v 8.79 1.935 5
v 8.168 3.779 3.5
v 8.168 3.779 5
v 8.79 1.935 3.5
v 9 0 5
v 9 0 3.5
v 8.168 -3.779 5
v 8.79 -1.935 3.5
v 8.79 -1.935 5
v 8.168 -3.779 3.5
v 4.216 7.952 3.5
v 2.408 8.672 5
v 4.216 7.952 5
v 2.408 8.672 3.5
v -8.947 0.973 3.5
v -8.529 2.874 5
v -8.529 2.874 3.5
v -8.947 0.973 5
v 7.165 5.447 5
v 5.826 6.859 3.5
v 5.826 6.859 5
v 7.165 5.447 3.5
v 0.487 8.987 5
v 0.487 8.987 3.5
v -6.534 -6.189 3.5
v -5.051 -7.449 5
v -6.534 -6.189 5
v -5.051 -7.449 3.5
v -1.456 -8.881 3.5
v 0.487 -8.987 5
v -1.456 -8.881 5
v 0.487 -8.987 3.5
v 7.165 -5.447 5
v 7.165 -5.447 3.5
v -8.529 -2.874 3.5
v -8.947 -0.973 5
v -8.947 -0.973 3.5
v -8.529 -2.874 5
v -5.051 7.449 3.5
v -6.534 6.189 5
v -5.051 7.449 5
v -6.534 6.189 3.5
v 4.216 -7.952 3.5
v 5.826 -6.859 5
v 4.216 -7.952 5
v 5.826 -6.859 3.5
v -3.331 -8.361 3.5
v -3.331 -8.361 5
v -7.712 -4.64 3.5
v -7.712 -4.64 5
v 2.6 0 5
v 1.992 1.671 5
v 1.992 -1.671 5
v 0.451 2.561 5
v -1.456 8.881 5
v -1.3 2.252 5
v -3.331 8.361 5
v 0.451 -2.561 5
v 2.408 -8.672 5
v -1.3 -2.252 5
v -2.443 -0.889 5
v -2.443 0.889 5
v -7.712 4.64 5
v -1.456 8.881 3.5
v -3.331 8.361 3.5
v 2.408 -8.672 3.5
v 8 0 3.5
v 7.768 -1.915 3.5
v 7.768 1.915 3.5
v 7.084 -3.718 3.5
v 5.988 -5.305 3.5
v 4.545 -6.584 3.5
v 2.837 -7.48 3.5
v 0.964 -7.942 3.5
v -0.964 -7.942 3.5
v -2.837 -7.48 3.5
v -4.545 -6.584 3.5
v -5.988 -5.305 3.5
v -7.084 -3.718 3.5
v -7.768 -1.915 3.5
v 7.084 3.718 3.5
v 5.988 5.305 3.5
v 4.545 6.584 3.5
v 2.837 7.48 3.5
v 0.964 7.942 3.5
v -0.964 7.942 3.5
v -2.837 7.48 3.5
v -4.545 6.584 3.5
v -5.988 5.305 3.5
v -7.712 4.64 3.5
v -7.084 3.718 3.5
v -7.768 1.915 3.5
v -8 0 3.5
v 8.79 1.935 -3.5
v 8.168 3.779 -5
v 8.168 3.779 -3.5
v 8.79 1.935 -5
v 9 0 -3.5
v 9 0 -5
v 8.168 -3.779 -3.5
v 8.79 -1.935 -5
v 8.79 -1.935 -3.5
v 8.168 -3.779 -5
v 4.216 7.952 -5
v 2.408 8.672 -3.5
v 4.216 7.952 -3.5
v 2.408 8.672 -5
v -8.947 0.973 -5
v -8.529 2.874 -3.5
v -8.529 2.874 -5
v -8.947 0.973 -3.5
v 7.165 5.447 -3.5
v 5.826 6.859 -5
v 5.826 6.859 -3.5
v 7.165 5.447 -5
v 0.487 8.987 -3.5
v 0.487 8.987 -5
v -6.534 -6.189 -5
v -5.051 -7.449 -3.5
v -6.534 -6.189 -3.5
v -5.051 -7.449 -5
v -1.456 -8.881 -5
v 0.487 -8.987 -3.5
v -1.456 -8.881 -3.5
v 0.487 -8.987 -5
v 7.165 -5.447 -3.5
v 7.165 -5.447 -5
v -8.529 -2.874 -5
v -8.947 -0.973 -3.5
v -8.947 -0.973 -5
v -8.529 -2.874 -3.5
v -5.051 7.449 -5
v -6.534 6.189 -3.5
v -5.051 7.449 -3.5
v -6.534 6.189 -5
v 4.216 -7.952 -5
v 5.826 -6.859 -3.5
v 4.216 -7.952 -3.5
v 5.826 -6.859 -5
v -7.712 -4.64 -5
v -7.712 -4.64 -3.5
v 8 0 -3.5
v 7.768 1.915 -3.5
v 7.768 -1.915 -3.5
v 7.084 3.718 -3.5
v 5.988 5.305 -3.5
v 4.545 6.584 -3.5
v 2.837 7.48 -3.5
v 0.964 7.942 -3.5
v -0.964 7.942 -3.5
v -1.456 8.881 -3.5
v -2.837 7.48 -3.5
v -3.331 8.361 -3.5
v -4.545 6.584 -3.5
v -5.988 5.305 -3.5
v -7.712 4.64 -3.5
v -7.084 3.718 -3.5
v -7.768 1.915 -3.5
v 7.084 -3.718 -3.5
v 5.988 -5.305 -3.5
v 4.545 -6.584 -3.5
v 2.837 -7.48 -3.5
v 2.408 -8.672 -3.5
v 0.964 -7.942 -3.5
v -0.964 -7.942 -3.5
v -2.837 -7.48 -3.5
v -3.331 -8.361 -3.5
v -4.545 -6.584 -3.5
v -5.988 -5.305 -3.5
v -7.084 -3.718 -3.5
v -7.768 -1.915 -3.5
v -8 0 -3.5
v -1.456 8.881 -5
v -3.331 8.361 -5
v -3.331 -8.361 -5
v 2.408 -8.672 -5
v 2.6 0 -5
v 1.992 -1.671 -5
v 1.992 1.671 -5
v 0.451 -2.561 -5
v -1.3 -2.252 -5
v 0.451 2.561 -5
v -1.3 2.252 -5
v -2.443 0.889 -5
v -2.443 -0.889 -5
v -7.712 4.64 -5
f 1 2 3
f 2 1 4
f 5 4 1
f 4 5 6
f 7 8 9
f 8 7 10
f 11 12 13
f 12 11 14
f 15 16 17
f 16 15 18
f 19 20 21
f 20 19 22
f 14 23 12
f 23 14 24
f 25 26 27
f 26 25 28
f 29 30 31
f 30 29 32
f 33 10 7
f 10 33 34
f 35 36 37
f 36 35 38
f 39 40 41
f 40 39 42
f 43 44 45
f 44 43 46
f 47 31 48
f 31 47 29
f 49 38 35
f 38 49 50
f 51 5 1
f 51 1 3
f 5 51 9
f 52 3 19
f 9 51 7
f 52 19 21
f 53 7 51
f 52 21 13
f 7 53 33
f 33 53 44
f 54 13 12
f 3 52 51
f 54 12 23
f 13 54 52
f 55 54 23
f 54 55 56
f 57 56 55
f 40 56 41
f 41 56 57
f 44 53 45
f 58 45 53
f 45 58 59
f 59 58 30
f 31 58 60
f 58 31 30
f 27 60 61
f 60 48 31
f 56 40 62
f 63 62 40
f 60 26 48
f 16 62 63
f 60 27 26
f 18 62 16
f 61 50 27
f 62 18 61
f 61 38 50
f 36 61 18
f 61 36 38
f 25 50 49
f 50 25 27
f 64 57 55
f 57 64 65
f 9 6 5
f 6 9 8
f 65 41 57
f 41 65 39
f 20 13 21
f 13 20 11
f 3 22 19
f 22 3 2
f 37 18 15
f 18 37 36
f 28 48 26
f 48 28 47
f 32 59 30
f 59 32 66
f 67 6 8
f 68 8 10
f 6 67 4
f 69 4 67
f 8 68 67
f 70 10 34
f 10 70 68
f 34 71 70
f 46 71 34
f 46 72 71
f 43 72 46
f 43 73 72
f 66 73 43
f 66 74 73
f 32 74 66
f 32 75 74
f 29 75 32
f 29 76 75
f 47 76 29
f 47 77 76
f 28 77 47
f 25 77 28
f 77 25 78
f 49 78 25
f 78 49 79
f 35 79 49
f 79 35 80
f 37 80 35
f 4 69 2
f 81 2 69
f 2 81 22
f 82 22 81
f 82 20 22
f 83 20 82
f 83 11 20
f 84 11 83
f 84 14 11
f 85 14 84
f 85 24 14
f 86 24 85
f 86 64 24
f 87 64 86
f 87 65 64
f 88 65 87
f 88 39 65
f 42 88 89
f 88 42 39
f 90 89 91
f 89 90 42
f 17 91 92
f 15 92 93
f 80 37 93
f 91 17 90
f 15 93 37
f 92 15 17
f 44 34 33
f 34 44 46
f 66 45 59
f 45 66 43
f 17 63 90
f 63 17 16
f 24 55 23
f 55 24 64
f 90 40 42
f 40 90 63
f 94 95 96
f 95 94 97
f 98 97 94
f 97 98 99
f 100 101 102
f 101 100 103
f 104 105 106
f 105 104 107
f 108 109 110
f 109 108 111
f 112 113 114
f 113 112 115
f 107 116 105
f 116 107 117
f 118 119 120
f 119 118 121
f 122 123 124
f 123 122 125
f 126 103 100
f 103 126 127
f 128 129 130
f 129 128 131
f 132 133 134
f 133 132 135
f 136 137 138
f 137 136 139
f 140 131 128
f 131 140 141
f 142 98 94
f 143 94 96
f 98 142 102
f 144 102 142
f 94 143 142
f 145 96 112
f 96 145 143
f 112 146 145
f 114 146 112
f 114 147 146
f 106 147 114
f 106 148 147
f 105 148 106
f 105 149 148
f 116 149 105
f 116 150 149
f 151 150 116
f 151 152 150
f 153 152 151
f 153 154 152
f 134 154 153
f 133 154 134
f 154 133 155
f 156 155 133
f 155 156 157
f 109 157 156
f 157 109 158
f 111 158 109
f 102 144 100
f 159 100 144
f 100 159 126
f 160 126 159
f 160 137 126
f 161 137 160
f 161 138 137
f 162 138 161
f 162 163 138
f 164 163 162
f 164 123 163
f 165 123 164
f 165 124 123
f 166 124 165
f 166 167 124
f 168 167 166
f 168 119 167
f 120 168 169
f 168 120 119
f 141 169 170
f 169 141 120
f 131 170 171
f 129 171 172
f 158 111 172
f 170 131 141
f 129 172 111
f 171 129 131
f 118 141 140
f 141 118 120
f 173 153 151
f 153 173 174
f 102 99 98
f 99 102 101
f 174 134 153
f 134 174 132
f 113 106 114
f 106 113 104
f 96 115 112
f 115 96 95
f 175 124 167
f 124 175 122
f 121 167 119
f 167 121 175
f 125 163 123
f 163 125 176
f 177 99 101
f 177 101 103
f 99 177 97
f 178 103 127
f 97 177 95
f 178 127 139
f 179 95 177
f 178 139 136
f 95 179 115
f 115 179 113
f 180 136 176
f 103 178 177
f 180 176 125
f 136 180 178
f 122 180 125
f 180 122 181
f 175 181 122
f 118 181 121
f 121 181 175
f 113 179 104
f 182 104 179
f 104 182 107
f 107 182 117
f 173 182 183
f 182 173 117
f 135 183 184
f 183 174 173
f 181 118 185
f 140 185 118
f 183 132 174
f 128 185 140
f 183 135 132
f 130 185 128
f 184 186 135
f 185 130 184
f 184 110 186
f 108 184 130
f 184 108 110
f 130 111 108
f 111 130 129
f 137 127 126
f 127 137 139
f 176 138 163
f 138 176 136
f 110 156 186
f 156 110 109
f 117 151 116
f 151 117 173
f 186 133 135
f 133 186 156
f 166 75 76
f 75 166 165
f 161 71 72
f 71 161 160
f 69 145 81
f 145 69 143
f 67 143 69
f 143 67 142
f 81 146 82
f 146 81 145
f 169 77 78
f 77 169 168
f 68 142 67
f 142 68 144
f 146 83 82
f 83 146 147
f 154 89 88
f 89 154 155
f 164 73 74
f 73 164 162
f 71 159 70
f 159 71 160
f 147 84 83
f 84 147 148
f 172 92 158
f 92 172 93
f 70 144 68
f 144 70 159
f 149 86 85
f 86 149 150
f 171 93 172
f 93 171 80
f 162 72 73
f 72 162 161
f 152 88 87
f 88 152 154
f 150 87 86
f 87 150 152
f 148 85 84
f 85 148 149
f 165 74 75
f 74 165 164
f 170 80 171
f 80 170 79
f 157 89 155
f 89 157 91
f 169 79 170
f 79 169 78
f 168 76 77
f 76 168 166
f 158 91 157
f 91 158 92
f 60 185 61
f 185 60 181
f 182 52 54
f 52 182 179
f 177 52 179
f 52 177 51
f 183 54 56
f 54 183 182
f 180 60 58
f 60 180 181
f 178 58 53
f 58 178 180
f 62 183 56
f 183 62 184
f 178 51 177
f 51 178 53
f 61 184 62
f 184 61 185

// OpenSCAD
// Parameters
tooth_count = 20; //[10:80:1]
pitch_diameter_mm = 12.22; //[6.11:24.44:0.01]
pitch_radius_mm = 6.11; //[3.055:12.22:0.01]
belt_pitch_mm = 2; //[1:10:0.01]
pulley_width_mm = 7; //[3.5:14:0.1]
tooth_radial_height_mm = 1.2; //[0.6:2.4:0.05]
tooth_tangential_width_mm = 1.4; //[0.7:2.8:0.05]
tooth_overlap_mm = 0.8; //[0.3:2:0.05]
bore_diameter_mm = 5; //[2.5:10:0.01]
hub_diameter_mm = 16; //[8:32:0.1]
hub_length_mm = 10; //[5:20:0.1]
flanges_optional_by_param = 1; //[0:1:1]
flange_diameter_mm = 18; //[9:36:0.1]
flange_thickness_mm = 1.5; //[0.8:3:0.1]
tolerance_mm = 0.2; //[0:0.6:0.01]

// Pulley - complete geometry
module pulley() {
  color("Silver") {
    union() {
      // Toothed pulley body
      cylinder(r=pitch_radius_mm + tooth_radial_height_mm - tooth_overlap_mm, h=pulley_width_mm, center=true);
      
      // Hub section
      cylinder(r=hub_diameter_mm/2, h=hub_length_mm, center=true);
      
      // Flanges
      if (flanges_optional_by_param) {
        translate([0, 0, pulley_width_mm/2 + flange_thickness_mm/2])
          cylinder(r=flange_diameter_mm/2, h=flange_thickness_mm, center=true);
        translate([0, 0, -pulley_width_mm/2 - flange_thickness_mm/2])
          cylinder(r=flange_diameter_mm/2, h=flange_thickness_mm, center=true);
      }
    }
  }
}

// Printed Pulley Teeth - complete geometry
module printed_pulley_teeth() {
  for (i = [0:tooth_count-1]) {
    rotate([0, 0, i*360/tooth_count]) {
      translate([pitch_radius_mm + (tooth_radial_height_mm + tooth_overlap_mm)/2 - tooth_overlap_mm, 0, 0]) {
        cube([tooth_radial_height_mm + tooth_overlap_mm, tooth_tangential_width_mm, pulley_width_mm], center=true);
      }
    }
  }
}

// Printed Pulley Teeth From Profile - complete geometry
module printed_pulley_teeth_from_profile() {
  union() {
    printed_pulley_teeth();
    cylinder(r=pitch_radius_mm, h=pulley_width_mm, center=true);
  }
}

// Printed Pulley GT2 Teeth - complete geometry
module printed_pulley_GT2_teeth() {
  union() {
    printed_pulley_teeth_from_profile();
  }
}

// Assembly
module assembly() {
  difference() {
    union() {
      pulley();
      printed_pulley_GT2_teeth();
    }
    // Center bore
    cylinder(r=(bore_diameter_mm + tolerance_mm)/2, h=hub_length_mm + pulley_width_mm + 2*flange_thickness_mm + 2, center=true);
  }
}

assembly();
